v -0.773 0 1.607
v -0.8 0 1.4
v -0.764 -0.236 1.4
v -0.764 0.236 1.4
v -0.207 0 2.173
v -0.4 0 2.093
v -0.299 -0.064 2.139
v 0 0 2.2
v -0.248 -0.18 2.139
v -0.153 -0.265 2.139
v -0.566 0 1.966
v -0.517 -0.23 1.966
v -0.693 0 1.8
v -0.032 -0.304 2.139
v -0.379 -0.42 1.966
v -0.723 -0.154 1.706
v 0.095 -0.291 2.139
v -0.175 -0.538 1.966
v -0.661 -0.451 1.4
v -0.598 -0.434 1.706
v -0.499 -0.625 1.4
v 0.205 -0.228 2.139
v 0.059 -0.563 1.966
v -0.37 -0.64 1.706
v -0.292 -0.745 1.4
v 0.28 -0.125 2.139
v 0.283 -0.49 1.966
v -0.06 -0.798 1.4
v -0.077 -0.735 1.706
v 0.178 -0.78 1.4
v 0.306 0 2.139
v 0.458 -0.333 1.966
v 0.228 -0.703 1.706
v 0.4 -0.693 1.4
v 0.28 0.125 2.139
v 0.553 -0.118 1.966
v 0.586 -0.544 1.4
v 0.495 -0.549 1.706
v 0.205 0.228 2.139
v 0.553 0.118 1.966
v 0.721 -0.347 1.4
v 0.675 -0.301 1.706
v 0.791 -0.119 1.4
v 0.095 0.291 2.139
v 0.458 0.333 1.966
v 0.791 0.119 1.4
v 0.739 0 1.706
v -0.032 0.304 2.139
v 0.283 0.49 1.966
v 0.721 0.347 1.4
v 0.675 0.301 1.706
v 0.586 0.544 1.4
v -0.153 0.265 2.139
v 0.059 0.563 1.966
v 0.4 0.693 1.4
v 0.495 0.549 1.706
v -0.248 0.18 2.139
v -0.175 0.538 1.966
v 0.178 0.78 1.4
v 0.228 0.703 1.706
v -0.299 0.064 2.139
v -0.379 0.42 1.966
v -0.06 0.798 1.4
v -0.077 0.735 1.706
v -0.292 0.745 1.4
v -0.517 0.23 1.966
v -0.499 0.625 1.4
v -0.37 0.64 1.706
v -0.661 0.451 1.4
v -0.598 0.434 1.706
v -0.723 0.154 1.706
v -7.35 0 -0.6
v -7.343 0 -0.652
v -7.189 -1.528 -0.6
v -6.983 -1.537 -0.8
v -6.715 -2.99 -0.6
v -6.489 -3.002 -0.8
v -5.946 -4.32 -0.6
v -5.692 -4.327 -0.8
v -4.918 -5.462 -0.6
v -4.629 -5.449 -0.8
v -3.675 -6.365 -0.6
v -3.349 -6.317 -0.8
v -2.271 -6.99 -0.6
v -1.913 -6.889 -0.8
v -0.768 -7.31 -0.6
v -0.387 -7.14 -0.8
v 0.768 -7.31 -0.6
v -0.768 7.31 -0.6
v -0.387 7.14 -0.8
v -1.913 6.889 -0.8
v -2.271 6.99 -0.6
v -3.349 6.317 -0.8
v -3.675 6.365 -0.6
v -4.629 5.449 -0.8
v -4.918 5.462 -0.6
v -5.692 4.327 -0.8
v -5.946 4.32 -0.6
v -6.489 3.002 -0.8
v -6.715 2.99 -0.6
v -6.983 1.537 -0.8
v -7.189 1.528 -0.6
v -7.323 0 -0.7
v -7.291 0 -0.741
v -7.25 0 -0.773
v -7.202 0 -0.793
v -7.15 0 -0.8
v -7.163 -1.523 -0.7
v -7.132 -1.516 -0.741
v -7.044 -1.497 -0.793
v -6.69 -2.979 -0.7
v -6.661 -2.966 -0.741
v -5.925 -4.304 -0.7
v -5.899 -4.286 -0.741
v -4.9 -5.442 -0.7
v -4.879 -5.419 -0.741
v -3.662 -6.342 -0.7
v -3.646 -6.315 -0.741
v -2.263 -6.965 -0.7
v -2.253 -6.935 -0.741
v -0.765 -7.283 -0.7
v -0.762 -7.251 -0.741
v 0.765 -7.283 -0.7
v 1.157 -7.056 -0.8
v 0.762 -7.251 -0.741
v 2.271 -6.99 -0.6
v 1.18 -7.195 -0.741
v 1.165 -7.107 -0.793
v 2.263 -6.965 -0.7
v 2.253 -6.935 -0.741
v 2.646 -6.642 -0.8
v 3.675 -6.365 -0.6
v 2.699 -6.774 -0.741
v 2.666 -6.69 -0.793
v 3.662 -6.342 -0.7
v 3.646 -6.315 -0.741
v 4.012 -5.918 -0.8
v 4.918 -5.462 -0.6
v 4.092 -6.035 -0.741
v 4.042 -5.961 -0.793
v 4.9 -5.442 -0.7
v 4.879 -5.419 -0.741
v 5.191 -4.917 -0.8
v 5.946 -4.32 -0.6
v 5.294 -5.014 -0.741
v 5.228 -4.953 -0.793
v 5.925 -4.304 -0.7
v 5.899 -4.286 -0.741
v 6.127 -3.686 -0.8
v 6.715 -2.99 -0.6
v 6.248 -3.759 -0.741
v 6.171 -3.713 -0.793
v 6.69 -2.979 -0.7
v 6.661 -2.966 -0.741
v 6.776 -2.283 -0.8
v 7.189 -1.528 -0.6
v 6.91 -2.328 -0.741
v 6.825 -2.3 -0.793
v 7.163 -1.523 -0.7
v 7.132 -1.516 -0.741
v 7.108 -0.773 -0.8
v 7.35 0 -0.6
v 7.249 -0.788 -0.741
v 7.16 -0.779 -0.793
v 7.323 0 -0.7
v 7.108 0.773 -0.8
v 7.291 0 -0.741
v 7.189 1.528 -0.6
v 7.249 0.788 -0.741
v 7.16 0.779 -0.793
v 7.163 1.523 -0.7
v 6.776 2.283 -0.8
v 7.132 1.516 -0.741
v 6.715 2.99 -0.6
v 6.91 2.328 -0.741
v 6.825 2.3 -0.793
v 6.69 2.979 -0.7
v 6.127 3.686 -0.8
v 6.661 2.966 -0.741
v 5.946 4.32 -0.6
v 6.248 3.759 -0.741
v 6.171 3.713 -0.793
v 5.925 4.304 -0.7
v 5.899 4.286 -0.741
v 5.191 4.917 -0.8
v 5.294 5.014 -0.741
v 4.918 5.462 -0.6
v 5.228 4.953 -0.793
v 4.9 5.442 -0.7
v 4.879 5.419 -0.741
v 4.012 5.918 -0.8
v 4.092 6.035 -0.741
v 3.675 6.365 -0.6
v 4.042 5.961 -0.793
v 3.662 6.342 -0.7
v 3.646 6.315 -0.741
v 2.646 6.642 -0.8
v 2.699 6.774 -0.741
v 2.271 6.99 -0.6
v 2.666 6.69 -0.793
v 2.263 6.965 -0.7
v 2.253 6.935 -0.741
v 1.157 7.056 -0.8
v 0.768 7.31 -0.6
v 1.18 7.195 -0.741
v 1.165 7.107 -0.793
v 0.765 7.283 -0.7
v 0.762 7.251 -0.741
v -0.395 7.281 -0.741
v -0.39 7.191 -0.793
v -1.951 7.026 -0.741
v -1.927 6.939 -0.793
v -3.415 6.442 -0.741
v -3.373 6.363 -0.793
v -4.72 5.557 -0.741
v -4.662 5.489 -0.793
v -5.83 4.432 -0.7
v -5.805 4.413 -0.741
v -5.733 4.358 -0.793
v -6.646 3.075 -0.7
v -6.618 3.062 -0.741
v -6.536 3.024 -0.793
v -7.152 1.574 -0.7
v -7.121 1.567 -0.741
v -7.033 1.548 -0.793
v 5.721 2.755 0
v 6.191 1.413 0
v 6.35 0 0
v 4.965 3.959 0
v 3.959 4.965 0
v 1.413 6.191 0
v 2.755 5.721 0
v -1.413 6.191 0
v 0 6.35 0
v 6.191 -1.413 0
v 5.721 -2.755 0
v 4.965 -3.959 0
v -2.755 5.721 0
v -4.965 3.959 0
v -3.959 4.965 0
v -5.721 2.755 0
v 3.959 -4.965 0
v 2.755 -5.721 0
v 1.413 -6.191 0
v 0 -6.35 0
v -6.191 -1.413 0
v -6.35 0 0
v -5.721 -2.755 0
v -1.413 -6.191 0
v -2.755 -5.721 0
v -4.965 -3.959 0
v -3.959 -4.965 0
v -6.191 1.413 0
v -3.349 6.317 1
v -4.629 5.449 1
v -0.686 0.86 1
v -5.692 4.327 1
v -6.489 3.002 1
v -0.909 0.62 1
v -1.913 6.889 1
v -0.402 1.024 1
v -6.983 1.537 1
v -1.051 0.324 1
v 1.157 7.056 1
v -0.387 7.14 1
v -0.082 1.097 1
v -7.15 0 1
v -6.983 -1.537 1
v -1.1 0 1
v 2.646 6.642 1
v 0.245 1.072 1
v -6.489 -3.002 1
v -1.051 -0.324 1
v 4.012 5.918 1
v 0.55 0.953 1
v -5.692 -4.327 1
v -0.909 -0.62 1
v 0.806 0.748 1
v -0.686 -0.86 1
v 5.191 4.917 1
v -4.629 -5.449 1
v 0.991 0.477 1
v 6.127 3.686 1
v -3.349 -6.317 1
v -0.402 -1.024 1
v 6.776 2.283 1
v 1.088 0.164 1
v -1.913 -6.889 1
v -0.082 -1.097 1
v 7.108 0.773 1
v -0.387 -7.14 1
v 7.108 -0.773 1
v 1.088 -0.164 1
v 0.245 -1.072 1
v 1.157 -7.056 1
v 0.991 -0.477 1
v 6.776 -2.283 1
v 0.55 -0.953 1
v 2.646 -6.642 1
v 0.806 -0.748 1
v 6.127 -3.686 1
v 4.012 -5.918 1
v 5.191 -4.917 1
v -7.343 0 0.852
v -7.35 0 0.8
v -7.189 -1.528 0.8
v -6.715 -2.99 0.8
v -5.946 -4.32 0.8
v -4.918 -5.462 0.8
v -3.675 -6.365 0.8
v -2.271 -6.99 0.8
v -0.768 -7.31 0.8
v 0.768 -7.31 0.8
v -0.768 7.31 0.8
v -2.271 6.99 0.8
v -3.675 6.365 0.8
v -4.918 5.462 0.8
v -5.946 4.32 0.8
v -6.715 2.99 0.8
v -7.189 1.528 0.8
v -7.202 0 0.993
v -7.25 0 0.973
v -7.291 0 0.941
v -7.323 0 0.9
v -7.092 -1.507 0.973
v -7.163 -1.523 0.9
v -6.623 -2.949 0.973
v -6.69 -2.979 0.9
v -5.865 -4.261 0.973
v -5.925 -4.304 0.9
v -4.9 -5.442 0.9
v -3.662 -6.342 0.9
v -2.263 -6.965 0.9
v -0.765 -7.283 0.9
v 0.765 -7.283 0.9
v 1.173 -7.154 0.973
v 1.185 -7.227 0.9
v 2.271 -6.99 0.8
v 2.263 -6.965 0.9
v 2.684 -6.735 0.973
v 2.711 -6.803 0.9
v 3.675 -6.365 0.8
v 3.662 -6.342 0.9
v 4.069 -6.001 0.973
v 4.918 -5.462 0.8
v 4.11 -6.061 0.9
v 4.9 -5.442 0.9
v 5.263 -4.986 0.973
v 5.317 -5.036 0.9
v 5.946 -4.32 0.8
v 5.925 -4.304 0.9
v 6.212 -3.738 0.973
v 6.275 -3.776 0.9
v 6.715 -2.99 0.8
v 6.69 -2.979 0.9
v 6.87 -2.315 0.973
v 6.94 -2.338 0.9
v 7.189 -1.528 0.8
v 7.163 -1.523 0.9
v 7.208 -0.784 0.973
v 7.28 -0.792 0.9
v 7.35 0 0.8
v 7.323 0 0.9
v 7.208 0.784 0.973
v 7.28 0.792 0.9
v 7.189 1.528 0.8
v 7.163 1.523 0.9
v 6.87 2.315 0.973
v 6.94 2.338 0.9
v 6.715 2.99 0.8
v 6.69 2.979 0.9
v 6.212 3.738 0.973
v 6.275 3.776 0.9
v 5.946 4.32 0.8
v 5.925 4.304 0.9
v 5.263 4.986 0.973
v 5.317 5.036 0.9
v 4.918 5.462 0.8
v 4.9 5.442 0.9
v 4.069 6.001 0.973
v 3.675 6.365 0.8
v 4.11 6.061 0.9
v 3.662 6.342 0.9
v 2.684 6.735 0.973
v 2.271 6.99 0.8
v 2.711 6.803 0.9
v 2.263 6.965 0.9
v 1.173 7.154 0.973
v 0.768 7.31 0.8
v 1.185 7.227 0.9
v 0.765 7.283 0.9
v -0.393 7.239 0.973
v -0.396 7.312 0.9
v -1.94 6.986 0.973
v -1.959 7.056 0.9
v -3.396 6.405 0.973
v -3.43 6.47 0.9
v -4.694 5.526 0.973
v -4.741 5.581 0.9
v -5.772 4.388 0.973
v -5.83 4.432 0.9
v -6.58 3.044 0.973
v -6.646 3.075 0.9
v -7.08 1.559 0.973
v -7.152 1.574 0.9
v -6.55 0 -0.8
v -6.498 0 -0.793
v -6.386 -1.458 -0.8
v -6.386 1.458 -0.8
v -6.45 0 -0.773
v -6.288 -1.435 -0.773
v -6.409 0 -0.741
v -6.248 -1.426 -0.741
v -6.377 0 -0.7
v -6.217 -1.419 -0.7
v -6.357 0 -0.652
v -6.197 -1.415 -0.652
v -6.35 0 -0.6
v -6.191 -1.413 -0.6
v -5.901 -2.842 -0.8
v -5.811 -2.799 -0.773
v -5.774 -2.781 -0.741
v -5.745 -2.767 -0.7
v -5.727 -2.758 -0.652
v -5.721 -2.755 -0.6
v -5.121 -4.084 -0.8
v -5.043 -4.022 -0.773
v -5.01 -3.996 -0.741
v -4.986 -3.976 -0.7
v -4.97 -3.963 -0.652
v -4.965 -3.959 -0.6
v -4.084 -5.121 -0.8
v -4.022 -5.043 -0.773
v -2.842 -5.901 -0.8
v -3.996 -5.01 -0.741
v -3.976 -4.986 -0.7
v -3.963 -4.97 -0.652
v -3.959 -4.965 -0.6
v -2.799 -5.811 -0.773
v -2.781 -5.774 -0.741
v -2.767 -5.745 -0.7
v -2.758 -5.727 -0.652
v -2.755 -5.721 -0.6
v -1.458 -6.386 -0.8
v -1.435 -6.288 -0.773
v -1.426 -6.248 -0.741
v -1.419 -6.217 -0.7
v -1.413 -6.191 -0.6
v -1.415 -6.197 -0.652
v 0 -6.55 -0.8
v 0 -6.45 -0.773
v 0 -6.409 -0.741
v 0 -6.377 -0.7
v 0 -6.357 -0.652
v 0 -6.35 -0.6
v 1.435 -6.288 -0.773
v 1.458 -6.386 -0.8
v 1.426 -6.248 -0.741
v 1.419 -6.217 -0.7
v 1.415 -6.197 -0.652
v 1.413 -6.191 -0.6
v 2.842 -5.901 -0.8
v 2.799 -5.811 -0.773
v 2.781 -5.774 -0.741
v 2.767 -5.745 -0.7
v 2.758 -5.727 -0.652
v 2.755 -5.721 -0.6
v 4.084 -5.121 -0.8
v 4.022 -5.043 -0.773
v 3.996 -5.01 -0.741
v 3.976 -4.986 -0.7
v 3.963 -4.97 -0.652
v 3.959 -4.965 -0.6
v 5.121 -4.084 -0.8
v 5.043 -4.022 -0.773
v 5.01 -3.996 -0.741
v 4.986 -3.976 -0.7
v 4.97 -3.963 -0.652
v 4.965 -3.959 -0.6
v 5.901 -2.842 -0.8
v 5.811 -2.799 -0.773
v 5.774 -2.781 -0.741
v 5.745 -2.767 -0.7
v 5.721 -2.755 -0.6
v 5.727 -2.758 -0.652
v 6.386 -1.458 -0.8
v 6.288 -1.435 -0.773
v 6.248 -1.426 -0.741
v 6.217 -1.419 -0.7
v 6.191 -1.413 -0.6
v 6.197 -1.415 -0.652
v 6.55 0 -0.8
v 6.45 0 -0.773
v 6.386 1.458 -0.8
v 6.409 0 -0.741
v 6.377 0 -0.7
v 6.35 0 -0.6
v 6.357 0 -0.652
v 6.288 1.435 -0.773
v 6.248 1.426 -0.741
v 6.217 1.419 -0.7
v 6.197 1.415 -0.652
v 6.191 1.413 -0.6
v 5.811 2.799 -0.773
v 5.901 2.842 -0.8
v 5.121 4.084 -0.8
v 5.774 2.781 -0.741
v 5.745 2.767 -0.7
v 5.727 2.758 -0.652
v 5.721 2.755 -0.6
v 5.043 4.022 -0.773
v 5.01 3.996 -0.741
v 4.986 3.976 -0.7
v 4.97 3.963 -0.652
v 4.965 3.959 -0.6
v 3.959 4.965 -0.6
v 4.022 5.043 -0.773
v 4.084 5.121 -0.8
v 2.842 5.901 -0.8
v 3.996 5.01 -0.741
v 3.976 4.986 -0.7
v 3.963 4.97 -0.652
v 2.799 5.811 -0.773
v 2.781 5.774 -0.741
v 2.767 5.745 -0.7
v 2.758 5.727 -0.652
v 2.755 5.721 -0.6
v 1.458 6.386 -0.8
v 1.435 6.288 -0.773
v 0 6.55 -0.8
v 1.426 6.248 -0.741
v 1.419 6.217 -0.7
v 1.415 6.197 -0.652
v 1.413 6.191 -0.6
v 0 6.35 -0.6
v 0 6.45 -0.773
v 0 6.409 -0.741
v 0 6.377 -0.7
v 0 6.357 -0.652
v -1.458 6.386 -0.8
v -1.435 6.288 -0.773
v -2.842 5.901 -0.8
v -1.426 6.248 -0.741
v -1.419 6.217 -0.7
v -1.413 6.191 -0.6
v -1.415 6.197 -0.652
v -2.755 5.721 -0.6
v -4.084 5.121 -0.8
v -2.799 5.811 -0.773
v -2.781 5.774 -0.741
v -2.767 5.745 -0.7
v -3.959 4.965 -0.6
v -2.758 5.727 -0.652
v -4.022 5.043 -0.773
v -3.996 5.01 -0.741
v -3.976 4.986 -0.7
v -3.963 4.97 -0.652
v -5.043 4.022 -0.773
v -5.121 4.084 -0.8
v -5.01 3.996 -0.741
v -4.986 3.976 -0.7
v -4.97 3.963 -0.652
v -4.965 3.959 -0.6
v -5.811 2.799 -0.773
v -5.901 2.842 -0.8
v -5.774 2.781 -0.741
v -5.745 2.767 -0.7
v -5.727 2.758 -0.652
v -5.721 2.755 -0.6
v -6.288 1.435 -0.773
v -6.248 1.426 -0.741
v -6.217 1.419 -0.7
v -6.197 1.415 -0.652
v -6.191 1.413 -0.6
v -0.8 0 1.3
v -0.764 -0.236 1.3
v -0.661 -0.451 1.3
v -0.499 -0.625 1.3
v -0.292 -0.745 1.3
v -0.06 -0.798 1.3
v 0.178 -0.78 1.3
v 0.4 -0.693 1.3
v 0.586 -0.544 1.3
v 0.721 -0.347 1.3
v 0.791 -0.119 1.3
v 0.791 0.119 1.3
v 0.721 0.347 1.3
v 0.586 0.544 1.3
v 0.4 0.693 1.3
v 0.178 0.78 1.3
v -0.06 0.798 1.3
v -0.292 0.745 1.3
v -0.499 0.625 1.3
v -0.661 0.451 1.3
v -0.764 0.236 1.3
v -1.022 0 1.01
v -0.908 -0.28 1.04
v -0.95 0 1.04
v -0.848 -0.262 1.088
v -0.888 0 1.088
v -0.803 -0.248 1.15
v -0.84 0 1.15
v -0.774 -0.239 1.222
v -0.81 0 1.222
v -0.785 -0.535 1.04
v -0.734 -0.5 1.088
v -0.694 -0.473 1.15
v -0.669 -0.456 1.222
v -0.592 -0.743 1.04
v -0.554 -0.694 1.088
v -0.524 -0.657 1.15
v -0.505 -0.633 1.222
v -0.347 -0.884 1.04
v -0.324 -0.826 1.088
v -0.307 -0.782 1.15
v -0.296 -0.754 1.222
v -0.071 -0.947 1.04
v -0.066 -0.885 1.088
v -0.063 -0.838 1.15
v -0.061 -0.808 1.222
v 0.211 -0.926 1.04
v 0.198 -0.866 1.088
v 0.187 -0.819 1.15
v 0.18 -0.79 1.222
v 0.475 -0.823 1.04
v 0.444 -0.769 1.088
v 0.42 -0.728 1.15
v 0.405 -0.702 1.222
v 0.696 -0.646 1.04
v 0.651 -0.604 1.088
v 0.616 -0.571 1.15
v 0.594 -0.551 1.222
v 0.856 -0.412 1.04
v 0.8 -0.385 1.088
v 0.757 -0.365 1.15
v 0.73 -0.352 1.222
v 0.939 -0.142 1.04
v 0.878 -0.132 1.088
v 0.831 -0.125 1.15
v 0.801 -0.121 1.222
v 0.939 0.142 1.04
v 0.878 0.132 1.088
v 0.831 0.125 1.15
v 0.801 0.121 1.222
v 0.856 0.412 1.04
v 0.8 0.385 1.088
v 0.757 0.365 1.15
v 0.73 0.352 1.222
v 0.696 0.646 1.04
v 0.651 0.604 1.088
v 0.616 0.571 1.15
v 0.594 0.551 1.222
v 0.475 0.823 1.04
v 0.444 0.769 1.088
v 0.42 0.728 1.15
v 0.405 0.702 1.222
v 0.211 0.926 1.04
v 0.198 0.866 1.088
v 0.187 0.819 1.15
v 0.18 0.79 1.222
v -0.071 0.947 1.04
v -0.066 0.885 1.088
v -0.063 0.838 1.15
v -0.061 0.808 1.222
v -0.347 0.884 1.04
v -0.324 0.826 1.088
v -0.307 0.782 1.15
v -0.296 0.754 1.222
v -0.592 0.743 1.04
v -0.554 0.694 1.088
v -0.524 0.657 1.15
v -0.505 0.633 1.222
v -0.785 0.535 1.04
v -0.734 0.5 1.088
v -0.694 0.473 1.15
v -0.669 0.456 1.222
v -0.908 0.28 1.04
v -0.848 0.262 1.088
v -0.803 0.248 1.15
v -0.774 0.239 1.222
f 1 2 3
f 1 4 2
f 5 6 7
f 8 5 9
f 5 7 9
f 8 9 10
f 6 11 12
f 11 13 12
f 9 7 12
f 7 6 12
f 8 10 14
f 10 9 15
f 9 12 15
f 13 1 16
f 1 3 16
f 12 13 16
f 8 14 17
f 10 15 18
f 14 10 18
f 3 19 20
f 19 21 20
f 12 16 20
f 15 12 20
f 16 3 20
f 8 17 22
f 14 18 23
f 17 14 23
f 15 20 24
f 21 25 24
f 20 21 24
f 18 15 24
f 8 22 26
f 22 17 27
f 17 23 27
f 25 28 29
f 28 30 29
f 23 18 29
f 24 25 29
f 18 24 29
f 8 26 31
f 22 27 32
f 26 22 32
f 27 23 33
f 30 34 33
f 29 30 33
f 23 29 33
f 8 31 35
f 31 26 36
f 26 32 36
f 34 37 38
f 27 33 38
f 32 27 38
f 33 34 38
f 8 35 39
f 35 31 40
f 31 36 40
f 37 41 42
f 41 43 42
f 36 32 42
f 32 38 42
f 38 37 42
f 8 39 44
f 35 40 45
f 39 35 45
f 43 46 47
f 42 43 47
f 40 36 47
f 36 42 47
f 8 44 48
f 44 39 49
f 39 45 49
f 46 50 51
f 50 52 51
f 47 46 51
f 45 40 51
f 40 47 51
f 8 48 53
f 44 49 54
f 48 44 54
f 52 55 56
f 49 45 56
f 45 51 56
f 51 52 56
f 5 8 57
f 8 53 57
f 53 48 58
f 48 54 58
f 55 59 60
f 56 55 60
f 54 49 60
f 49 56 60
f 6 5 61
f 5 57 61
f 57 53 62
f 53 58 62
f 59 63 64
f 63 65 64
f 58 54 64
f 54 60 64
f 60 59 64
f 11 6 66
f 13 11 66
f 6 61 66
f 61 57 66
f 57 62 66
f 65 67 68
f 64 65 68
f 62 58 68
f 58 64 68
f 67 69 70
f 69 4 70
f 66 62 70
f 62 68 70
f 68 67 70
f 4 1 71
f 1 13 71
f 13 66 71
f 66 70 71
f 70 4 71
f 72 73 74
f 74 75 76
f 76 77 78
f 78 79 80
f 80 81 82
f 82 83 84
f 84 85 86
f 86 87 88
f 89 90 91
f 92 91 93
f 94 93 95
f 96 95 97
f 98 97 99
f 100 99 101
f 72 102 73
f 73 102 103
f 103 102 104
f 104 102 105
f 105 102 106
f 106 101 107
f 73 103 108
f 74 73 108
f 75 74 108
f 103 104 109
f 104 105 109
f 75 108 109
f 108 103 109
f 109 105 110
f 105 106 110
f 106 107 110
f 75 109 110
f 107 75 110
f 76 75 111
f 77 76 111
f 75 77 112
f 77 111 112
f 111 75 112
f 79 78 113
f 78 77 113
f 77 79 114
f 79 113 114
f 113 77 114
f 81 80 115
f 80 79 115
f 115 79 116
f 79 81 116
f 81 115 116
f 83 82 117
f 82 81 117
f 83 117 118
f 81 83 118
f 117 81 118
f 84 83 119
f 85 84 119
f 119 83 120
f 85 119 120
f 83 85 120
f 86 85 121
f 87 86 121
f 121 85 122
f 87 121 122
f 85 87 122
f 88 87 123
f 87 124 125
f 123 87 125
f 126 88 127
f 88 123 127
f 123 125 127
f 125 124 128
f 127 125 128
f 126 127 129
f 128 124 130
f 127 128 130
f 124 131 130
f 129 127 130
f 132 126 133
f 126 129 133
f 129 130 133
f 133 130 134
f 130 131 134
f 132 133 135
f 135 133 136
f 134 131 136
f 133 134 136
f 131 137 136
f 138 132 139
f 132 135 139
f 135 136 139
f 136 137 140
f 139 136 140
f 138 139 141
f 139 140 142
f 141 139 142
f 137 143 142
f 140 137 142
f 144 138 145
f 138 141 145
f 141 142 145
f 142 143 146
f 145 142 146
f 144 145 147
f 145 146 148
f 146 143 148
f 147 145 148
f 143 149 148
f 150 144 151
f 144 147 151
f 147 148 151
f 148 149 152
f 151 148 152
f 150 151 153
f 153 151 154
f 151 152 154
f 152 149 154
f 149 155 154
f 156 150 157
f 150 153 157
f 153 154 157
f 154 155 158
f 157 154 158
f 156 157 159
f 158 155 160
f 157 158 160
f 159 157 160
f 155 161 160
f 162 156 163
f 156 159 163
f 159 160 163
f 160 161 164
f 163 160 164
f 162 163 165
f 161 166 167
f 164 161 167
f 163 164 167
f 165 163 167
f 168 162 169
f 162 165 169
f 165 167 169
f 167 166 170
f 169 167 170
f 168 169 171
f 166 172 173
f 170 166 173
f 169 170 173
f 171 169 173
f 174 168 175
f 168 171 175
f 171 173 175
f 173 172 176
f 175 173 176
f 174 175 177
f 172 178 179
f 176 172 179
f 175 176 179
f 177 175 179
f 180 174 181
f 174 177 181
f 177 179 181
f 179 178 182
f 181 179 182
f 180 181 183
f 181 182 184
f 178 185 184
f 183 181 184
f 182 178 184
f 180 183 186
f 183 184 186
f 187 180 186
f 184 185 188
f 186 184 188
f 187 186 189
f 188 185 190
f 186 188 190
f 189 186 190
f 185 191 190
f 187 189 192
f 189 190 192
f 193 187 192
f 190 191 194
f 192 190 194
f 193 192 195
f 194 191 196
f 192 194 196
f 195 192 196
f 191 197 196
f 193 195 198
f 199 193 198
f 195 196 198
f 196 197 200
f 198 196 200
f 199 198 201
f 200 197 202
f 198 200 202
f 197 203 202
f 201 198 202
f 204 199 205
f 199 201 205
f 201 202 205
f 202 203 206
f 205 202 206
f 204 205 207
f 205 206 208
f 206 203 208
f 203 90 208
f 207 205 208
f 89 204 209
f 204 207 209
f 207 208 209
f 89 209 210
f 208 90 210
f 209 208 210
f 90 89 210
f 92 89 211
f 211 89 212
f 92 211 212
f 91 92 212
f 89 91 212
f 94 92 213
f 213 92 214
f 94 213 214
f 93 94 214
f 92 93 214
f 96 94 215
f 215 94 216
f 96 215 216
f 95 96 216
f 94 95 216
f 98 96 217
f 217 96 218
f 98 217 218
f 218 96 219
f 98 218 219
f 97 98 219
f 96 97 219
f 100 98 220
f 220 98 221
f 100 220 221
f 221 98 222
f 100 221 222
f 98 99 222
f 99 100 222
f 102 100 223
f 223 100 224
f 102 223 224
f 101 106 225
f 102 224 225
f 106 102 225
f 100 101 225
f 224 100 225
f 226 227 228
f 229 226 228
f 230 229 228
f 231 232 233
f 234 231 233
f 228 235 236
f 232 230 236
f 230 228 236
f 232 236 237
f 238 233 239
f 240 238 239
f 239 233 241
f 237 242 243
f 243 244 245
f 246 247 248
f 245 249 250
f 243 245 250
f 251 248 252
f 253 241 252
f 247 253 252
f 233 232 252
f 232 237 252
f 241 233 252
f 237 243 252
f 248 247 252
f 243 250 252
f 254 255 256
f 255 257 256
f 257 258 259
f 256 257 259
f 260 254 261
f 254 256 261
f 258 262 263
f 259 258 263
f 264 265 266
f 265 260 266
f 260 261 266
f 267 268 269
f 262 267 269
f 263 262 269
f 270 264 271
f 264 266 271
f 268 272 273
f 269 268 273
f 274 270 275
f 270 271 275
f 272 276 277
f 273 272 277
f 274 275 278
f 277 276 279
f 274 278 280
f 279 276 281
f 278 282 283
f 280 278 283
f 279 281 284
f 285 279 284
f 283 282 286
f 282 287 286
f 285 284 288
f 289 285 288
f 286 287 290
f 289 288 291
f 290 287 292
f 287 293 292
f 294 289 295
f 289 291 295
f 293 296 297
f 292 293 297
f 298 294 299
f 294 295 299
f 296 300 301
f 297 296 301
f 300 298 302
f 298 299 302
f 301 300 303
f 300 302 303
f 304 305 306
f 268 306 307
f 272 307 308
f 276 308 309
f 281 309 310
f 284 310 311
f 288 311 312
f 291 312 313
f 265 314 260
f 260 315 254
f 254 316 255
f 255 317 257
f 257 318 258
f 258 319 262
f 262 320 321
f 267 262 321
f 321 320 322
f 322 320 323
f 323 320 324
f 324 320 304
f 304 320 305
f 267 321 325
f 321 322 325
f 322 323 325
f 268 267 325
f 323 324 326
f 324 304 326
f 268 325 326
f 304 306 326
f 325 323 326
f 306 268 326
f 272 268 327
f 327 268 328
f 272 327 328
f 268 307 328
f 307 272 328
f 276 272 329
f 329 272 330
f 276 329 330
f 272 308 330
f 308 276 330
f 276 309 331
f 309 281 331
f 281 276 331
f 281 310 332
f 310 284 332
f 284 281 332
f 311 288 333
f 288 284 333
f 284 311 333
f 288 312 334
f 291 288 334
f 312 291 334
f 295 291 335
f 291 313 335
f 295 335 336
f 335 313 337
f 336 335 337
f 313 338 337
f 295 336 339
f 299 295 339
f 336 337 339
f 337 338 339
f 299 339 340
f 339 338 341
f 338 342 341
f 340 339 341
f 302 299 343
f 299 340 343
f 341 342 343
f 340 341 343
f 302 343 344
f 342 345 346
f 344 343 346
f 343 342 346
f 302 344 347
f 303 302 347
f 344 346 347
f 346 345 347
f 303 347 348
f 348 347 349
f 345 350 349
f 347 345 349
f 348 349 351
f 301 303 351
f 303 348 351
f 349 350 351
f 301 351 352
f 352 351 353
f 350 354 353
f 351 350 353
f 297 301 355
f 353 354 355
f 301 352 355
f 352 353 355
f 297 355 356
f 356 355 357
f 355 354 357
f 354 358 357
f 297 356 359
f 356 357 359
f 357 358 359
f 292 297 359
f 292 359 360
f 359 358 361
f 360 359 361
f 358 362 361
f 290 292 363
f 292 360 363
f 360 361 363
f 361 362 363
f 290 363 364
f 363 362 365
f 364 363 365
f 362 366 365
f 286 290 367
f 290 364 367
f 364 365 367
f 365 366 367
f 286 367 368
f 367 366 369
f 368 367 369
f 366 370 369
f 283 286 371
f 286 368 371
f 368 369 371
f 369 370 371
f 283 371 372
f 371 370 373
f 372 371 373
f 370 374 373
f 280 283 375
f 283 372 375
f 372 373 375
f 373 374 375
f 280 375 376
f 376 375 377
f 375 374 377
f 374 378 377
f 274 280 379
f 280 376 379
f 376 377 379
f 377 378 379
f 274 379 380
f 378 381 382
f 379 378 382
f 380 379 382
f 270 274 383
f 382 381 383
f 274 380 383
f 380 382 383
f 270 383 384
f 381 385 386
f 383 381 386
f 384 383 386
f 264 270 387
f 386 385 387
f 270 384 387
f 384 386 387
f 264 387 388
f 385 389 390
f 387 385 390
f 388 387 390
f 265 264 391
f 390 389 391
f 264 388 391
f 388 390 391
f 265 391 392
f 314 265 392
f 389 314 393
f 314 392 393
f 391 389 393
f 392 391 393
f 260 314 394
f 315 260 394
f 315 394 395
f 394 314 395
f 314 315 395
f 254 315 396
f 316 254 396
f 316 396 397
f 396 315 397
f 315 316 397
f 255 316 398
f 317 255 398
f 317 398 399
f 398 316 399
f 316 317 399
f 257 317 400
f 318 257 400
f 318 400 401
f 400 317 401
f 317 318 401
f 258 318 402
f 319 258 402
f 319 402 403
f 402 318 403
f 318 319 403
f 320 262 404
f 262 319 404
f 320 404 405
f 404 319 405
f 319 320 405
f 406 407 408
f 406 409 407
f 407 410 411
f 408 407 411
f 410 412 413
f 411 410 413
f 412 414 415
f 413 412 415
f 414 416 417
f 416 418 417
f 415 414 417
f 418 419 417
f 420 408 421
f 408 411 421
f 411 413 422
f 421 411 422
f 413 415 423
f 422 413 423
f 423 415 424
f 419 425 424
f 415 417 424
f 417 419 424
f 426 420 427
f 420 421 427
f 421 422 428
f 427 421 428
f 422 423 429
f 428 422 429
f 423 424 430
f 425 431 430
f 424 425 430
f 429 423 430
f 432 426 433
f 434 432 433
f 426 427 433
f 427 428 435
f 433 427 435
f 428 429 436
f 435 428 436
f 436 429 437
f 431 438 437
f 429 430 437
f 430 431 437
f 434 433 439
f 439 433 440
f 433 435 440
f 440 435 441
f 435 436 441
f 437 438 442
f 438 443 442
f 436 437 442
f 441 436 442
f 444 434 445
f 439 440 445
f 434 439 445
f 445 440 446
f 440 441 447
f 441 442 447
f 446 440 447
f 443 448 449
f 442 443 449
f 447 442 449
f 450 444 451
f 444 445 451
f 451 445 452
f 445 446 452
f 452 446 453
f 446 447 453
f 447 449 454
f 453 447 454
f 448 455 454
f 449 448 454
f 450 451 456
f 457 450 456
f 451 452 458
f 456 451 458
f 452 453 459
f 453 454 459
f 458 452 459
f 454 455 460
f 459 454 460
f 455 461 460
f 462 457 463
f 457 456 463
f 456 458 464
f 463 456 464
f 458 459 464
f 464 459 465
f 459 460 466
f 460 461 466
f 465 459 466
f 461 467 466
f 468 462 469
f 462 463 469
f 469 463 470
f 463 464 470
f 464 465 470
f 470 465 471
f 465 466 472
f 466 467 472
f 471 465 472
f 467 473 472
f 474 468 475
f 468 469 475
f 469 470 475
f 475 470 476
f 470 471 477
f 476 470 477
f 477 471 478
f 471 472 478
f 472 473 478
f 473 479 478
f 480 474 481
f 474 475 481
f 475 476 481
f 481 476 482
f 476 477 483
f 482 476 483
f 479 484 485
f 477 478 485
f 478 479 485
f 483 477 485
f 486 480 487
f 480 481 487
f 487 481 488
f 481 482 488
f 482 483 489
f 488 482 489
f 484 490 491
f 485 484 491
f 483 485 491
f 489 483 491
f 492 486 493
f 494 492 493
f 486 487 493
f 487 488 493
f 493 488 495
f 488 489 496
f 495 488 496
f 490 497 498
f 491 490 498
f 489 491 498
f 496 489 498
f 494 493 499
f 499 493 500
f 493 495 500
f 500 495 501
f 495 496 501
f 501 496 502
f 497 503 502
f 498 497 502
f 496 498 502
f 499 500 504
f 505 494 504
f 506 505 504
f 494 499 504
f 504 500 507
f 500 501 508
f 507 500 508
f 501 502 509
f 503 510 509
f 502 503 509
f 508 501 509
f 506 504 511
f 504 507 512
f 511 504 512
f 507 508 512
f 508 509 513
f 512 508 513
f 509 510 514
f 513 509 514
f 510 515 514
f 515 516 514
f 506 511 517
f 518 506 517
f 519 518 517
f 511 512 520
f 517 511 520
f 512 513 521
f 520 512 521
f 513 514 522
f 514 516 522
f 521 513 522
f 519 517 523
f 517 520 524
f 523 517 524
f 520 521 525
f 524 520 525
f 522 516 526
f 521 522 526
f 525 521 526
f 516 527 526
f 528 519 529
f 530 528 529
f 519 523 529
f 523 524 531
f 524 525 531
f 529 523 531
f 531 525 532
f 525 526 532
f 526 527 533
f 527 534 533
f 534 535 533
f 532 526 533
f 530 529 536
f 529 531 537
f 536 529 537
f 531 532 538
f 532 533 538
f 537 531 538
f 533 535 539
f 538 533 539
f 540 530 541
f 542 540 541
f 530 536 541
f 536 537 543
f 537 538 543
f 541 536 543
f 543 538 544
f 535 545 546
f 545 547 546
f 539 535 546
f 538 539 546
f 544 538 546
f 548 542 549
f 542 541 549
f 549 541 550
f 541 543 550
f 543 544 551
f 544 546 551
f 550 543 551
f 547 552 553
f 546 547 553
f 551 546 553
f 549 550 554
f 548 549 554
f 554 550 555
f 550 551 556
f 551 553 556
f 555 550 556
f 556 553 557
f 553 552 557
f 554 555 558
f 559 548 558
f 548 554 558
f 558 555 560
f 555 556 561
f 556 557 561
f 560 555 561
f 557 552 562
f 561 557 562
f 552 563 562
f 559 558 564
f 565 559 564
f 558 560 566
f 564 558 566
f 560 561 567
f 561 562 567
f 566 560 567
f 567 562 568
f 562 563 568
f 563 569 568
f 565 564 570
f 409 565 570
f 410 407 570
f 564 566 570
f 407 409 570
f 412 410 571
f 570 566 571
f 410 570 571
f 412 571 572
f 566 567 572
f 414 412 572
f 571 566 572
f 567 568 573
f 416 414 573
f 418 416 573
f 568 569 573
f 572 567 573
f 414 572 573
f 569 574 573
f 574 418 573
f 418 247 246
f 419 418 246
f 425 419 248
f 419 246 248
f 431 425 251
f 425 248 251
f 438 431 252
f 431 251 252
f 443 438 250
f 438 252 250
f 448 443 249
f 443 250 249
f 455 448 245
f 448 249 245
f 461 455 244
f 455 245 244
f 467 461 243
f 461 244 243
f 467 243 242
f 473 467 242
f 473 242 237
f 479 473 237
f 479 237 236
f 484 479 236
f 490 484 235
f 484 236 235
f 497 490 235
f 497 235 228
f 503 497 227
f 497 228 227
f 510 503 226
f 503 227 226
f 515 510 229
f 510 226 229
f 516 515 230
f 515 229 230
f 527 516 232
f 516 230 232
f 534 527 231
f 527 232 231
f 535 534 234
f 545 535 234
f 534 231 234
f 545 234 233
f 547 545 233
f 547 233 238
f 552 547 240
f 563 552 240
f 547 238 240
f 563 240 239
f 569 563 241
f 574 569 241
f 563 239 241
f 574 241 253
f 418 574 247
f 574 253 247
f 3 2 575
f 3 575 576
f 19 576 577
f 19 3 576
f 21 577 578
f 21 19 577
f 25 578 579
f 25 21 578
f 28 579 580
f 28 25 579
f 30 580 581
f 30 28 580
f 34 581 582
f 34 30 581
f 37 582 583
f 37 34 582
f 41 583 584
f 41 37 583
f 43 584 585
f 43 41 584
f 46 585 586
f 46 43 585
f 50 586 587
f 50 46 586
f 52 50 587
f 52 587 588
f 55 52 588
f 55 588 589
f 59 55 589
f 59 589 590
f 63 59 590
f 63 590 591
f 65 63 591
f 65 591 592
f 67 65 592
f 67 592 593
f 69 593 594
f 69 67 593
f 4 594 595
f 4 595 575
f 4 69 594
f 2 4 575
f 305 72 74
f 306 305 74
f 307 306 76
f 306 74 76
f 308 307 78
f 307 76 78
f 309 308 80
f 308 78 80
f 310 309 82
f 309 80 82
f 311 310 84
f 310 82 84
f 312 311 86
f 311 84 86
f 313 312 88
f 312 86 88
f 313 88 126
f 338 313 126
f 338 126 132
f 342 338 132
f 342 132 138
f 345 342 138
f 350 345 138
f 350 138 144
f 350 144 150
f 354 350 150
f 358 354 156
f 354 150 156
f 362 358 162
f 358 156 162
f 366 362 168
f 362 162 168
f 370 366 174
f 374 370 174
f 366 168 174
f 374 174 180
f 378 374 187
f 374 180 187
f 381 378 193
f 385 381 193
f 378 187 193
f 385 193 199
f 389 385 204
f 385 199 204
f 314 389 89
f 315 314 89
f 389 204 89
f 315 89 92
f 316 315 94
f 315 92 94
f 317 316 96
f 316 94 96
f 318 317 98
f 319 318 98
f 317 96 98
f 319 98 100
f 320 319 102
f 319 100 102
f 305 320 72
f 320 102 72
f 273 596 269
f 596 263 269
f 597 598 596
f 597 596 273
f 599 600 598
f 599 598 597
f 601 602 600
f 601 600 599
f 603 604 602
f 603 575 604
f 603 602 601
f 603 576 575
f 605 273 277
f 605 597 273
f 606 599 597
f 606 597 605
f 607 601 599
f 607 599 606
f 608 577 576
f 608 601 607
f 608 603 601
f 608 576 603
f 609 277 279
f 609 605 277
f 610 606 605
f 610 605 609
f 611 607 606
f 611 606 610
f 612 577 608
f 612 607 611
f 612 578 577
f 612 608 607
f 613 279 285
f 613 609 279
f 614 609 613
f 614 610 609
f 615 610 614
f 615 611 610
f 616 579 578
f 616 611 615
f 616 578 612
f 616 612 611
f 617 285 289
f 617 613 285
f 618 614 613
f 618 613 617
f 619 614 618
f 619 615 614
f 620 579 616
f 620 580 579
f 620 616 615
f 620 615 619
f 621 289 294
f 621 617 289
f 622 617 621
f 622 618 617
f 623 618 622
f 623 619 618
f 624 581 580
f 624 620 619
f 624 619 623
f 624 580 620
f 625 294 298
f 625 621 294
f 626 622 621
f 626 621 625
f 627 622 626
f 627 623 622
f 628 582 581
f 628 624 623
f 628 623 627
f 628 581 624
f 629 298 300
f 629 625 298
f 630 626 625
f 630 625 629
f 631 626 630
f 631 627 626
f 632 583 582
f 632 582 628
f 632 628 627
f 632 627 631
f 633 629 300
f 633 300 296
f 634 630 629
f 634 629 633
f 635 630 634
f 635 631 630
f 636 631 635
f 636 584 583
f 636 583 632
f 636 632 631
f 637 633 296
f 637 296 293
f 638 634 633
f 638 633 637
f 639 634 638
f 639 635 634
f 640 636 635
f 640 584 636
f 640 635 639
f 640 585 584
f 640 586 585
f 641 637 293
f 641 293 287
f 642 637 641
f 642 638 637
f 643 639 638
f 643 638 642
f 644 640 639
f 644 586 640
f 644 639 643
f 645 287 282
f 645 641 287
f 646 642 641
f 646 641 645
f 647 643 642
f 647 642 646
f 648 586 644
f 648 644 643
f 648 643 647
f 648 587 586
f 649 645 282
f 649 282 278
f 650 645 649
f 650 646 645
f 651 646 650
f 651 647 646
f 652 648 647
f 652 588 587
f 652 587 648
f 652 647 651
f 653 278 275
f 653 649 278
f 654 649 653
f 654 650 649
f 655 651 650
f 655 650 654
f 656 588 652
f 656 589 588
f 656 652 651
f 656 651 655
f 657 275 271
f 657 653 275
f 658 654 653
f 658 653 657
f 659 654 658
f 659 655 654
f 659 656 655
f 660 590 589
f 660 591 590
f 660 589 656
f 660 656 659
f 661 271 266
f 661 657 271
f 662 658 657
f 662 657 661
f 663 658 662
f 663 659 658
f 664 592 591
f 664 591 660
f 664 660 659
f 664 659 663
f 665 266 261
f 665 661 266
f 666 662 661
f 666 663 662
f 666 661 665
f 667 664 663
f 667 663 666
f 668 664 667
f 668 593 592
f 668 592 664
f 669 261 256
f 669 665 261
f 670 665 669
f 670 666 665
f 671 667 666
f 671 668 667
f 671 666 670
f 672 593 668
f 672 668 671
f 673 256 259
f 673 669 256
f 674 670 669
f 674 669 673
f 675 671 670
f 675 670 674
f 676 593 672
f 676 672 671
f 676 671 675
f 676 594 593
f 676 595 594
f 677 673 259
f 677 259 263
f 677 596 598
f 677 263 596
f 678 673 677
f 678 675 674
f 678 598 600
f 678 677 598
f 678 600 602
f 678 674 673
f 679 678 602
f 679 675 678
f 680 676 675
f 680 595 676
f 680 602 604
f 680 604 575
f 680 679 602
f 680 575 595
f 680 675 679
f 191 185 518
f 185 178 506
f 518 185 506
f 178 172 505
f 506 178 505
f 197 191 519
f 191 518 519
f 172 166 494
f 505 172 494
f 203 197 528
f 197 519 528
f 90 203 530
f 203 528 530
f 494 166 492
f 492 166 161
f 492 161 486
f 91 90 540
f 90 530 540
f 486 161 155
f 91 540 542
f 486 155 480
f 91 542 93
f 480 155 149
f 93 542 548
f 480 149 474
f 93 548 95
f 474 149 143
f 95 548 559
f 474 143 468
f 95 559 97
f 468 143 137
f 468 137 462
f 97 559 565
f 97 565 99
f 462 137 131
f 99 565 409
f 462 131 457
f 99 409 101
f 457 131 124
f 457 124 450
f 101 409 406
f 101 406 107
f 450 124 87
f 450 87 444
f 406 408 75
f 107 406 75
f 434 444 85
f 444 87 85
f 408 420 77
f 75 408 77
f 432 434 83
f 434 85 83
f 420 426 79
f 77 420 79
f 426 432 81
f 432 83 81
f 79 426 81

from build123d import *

# Parameters (mm, degrees)
F0_W = 0.8
F0_H = 0.4
F2_R = 0.2
F3_R = 0.3


# Not quite as in the source:
# - a feature names something its author has since deleted; it is built from what else it names


with BuildPart() as f1:
    # F0 (on Front) → F1 (revolve)
    with BuildSketch(Plane.XZ):
        Polygon((-6.35, 0), (0, 0), (0, 1), (-0.8, 1), (-7.35, 1), (-7.35, -0.8), (-6.35, -0.8), align=None)
        with Locations((-0.4, 1.2)):
            Rectangle(F0_W, F0_H)
        with BuildLine():
            Line((-0.8, 1.4), (0, 1.4))
            Line((0, 1.4), (0, 2.2))
            ThreePointArc((0, 2.2), (-0.5656854249, 1.9656854249), (-0.8, 1.4))
        make_face()
    revolve(axis=Axis((0, 0, 0.5), (0, 0, 1)))

    # F2
    f2_edges = [f1.edges().sort_by_distance(p)[0] for p in [
        (7.35, 0, 1),
        (7.35, 0, -0.8),
        (6.35, 0, -0.8),
    ]]
    fillet(f2_edges, radius=F2_R)

    # F3
    f3_edges = [f1.edges().sort_by_distance(p)[0] for p in [
        (0.8, 0, 1),
    ]]
    fillet(f3_edges, radius=F3_R)


solid = f1.part
